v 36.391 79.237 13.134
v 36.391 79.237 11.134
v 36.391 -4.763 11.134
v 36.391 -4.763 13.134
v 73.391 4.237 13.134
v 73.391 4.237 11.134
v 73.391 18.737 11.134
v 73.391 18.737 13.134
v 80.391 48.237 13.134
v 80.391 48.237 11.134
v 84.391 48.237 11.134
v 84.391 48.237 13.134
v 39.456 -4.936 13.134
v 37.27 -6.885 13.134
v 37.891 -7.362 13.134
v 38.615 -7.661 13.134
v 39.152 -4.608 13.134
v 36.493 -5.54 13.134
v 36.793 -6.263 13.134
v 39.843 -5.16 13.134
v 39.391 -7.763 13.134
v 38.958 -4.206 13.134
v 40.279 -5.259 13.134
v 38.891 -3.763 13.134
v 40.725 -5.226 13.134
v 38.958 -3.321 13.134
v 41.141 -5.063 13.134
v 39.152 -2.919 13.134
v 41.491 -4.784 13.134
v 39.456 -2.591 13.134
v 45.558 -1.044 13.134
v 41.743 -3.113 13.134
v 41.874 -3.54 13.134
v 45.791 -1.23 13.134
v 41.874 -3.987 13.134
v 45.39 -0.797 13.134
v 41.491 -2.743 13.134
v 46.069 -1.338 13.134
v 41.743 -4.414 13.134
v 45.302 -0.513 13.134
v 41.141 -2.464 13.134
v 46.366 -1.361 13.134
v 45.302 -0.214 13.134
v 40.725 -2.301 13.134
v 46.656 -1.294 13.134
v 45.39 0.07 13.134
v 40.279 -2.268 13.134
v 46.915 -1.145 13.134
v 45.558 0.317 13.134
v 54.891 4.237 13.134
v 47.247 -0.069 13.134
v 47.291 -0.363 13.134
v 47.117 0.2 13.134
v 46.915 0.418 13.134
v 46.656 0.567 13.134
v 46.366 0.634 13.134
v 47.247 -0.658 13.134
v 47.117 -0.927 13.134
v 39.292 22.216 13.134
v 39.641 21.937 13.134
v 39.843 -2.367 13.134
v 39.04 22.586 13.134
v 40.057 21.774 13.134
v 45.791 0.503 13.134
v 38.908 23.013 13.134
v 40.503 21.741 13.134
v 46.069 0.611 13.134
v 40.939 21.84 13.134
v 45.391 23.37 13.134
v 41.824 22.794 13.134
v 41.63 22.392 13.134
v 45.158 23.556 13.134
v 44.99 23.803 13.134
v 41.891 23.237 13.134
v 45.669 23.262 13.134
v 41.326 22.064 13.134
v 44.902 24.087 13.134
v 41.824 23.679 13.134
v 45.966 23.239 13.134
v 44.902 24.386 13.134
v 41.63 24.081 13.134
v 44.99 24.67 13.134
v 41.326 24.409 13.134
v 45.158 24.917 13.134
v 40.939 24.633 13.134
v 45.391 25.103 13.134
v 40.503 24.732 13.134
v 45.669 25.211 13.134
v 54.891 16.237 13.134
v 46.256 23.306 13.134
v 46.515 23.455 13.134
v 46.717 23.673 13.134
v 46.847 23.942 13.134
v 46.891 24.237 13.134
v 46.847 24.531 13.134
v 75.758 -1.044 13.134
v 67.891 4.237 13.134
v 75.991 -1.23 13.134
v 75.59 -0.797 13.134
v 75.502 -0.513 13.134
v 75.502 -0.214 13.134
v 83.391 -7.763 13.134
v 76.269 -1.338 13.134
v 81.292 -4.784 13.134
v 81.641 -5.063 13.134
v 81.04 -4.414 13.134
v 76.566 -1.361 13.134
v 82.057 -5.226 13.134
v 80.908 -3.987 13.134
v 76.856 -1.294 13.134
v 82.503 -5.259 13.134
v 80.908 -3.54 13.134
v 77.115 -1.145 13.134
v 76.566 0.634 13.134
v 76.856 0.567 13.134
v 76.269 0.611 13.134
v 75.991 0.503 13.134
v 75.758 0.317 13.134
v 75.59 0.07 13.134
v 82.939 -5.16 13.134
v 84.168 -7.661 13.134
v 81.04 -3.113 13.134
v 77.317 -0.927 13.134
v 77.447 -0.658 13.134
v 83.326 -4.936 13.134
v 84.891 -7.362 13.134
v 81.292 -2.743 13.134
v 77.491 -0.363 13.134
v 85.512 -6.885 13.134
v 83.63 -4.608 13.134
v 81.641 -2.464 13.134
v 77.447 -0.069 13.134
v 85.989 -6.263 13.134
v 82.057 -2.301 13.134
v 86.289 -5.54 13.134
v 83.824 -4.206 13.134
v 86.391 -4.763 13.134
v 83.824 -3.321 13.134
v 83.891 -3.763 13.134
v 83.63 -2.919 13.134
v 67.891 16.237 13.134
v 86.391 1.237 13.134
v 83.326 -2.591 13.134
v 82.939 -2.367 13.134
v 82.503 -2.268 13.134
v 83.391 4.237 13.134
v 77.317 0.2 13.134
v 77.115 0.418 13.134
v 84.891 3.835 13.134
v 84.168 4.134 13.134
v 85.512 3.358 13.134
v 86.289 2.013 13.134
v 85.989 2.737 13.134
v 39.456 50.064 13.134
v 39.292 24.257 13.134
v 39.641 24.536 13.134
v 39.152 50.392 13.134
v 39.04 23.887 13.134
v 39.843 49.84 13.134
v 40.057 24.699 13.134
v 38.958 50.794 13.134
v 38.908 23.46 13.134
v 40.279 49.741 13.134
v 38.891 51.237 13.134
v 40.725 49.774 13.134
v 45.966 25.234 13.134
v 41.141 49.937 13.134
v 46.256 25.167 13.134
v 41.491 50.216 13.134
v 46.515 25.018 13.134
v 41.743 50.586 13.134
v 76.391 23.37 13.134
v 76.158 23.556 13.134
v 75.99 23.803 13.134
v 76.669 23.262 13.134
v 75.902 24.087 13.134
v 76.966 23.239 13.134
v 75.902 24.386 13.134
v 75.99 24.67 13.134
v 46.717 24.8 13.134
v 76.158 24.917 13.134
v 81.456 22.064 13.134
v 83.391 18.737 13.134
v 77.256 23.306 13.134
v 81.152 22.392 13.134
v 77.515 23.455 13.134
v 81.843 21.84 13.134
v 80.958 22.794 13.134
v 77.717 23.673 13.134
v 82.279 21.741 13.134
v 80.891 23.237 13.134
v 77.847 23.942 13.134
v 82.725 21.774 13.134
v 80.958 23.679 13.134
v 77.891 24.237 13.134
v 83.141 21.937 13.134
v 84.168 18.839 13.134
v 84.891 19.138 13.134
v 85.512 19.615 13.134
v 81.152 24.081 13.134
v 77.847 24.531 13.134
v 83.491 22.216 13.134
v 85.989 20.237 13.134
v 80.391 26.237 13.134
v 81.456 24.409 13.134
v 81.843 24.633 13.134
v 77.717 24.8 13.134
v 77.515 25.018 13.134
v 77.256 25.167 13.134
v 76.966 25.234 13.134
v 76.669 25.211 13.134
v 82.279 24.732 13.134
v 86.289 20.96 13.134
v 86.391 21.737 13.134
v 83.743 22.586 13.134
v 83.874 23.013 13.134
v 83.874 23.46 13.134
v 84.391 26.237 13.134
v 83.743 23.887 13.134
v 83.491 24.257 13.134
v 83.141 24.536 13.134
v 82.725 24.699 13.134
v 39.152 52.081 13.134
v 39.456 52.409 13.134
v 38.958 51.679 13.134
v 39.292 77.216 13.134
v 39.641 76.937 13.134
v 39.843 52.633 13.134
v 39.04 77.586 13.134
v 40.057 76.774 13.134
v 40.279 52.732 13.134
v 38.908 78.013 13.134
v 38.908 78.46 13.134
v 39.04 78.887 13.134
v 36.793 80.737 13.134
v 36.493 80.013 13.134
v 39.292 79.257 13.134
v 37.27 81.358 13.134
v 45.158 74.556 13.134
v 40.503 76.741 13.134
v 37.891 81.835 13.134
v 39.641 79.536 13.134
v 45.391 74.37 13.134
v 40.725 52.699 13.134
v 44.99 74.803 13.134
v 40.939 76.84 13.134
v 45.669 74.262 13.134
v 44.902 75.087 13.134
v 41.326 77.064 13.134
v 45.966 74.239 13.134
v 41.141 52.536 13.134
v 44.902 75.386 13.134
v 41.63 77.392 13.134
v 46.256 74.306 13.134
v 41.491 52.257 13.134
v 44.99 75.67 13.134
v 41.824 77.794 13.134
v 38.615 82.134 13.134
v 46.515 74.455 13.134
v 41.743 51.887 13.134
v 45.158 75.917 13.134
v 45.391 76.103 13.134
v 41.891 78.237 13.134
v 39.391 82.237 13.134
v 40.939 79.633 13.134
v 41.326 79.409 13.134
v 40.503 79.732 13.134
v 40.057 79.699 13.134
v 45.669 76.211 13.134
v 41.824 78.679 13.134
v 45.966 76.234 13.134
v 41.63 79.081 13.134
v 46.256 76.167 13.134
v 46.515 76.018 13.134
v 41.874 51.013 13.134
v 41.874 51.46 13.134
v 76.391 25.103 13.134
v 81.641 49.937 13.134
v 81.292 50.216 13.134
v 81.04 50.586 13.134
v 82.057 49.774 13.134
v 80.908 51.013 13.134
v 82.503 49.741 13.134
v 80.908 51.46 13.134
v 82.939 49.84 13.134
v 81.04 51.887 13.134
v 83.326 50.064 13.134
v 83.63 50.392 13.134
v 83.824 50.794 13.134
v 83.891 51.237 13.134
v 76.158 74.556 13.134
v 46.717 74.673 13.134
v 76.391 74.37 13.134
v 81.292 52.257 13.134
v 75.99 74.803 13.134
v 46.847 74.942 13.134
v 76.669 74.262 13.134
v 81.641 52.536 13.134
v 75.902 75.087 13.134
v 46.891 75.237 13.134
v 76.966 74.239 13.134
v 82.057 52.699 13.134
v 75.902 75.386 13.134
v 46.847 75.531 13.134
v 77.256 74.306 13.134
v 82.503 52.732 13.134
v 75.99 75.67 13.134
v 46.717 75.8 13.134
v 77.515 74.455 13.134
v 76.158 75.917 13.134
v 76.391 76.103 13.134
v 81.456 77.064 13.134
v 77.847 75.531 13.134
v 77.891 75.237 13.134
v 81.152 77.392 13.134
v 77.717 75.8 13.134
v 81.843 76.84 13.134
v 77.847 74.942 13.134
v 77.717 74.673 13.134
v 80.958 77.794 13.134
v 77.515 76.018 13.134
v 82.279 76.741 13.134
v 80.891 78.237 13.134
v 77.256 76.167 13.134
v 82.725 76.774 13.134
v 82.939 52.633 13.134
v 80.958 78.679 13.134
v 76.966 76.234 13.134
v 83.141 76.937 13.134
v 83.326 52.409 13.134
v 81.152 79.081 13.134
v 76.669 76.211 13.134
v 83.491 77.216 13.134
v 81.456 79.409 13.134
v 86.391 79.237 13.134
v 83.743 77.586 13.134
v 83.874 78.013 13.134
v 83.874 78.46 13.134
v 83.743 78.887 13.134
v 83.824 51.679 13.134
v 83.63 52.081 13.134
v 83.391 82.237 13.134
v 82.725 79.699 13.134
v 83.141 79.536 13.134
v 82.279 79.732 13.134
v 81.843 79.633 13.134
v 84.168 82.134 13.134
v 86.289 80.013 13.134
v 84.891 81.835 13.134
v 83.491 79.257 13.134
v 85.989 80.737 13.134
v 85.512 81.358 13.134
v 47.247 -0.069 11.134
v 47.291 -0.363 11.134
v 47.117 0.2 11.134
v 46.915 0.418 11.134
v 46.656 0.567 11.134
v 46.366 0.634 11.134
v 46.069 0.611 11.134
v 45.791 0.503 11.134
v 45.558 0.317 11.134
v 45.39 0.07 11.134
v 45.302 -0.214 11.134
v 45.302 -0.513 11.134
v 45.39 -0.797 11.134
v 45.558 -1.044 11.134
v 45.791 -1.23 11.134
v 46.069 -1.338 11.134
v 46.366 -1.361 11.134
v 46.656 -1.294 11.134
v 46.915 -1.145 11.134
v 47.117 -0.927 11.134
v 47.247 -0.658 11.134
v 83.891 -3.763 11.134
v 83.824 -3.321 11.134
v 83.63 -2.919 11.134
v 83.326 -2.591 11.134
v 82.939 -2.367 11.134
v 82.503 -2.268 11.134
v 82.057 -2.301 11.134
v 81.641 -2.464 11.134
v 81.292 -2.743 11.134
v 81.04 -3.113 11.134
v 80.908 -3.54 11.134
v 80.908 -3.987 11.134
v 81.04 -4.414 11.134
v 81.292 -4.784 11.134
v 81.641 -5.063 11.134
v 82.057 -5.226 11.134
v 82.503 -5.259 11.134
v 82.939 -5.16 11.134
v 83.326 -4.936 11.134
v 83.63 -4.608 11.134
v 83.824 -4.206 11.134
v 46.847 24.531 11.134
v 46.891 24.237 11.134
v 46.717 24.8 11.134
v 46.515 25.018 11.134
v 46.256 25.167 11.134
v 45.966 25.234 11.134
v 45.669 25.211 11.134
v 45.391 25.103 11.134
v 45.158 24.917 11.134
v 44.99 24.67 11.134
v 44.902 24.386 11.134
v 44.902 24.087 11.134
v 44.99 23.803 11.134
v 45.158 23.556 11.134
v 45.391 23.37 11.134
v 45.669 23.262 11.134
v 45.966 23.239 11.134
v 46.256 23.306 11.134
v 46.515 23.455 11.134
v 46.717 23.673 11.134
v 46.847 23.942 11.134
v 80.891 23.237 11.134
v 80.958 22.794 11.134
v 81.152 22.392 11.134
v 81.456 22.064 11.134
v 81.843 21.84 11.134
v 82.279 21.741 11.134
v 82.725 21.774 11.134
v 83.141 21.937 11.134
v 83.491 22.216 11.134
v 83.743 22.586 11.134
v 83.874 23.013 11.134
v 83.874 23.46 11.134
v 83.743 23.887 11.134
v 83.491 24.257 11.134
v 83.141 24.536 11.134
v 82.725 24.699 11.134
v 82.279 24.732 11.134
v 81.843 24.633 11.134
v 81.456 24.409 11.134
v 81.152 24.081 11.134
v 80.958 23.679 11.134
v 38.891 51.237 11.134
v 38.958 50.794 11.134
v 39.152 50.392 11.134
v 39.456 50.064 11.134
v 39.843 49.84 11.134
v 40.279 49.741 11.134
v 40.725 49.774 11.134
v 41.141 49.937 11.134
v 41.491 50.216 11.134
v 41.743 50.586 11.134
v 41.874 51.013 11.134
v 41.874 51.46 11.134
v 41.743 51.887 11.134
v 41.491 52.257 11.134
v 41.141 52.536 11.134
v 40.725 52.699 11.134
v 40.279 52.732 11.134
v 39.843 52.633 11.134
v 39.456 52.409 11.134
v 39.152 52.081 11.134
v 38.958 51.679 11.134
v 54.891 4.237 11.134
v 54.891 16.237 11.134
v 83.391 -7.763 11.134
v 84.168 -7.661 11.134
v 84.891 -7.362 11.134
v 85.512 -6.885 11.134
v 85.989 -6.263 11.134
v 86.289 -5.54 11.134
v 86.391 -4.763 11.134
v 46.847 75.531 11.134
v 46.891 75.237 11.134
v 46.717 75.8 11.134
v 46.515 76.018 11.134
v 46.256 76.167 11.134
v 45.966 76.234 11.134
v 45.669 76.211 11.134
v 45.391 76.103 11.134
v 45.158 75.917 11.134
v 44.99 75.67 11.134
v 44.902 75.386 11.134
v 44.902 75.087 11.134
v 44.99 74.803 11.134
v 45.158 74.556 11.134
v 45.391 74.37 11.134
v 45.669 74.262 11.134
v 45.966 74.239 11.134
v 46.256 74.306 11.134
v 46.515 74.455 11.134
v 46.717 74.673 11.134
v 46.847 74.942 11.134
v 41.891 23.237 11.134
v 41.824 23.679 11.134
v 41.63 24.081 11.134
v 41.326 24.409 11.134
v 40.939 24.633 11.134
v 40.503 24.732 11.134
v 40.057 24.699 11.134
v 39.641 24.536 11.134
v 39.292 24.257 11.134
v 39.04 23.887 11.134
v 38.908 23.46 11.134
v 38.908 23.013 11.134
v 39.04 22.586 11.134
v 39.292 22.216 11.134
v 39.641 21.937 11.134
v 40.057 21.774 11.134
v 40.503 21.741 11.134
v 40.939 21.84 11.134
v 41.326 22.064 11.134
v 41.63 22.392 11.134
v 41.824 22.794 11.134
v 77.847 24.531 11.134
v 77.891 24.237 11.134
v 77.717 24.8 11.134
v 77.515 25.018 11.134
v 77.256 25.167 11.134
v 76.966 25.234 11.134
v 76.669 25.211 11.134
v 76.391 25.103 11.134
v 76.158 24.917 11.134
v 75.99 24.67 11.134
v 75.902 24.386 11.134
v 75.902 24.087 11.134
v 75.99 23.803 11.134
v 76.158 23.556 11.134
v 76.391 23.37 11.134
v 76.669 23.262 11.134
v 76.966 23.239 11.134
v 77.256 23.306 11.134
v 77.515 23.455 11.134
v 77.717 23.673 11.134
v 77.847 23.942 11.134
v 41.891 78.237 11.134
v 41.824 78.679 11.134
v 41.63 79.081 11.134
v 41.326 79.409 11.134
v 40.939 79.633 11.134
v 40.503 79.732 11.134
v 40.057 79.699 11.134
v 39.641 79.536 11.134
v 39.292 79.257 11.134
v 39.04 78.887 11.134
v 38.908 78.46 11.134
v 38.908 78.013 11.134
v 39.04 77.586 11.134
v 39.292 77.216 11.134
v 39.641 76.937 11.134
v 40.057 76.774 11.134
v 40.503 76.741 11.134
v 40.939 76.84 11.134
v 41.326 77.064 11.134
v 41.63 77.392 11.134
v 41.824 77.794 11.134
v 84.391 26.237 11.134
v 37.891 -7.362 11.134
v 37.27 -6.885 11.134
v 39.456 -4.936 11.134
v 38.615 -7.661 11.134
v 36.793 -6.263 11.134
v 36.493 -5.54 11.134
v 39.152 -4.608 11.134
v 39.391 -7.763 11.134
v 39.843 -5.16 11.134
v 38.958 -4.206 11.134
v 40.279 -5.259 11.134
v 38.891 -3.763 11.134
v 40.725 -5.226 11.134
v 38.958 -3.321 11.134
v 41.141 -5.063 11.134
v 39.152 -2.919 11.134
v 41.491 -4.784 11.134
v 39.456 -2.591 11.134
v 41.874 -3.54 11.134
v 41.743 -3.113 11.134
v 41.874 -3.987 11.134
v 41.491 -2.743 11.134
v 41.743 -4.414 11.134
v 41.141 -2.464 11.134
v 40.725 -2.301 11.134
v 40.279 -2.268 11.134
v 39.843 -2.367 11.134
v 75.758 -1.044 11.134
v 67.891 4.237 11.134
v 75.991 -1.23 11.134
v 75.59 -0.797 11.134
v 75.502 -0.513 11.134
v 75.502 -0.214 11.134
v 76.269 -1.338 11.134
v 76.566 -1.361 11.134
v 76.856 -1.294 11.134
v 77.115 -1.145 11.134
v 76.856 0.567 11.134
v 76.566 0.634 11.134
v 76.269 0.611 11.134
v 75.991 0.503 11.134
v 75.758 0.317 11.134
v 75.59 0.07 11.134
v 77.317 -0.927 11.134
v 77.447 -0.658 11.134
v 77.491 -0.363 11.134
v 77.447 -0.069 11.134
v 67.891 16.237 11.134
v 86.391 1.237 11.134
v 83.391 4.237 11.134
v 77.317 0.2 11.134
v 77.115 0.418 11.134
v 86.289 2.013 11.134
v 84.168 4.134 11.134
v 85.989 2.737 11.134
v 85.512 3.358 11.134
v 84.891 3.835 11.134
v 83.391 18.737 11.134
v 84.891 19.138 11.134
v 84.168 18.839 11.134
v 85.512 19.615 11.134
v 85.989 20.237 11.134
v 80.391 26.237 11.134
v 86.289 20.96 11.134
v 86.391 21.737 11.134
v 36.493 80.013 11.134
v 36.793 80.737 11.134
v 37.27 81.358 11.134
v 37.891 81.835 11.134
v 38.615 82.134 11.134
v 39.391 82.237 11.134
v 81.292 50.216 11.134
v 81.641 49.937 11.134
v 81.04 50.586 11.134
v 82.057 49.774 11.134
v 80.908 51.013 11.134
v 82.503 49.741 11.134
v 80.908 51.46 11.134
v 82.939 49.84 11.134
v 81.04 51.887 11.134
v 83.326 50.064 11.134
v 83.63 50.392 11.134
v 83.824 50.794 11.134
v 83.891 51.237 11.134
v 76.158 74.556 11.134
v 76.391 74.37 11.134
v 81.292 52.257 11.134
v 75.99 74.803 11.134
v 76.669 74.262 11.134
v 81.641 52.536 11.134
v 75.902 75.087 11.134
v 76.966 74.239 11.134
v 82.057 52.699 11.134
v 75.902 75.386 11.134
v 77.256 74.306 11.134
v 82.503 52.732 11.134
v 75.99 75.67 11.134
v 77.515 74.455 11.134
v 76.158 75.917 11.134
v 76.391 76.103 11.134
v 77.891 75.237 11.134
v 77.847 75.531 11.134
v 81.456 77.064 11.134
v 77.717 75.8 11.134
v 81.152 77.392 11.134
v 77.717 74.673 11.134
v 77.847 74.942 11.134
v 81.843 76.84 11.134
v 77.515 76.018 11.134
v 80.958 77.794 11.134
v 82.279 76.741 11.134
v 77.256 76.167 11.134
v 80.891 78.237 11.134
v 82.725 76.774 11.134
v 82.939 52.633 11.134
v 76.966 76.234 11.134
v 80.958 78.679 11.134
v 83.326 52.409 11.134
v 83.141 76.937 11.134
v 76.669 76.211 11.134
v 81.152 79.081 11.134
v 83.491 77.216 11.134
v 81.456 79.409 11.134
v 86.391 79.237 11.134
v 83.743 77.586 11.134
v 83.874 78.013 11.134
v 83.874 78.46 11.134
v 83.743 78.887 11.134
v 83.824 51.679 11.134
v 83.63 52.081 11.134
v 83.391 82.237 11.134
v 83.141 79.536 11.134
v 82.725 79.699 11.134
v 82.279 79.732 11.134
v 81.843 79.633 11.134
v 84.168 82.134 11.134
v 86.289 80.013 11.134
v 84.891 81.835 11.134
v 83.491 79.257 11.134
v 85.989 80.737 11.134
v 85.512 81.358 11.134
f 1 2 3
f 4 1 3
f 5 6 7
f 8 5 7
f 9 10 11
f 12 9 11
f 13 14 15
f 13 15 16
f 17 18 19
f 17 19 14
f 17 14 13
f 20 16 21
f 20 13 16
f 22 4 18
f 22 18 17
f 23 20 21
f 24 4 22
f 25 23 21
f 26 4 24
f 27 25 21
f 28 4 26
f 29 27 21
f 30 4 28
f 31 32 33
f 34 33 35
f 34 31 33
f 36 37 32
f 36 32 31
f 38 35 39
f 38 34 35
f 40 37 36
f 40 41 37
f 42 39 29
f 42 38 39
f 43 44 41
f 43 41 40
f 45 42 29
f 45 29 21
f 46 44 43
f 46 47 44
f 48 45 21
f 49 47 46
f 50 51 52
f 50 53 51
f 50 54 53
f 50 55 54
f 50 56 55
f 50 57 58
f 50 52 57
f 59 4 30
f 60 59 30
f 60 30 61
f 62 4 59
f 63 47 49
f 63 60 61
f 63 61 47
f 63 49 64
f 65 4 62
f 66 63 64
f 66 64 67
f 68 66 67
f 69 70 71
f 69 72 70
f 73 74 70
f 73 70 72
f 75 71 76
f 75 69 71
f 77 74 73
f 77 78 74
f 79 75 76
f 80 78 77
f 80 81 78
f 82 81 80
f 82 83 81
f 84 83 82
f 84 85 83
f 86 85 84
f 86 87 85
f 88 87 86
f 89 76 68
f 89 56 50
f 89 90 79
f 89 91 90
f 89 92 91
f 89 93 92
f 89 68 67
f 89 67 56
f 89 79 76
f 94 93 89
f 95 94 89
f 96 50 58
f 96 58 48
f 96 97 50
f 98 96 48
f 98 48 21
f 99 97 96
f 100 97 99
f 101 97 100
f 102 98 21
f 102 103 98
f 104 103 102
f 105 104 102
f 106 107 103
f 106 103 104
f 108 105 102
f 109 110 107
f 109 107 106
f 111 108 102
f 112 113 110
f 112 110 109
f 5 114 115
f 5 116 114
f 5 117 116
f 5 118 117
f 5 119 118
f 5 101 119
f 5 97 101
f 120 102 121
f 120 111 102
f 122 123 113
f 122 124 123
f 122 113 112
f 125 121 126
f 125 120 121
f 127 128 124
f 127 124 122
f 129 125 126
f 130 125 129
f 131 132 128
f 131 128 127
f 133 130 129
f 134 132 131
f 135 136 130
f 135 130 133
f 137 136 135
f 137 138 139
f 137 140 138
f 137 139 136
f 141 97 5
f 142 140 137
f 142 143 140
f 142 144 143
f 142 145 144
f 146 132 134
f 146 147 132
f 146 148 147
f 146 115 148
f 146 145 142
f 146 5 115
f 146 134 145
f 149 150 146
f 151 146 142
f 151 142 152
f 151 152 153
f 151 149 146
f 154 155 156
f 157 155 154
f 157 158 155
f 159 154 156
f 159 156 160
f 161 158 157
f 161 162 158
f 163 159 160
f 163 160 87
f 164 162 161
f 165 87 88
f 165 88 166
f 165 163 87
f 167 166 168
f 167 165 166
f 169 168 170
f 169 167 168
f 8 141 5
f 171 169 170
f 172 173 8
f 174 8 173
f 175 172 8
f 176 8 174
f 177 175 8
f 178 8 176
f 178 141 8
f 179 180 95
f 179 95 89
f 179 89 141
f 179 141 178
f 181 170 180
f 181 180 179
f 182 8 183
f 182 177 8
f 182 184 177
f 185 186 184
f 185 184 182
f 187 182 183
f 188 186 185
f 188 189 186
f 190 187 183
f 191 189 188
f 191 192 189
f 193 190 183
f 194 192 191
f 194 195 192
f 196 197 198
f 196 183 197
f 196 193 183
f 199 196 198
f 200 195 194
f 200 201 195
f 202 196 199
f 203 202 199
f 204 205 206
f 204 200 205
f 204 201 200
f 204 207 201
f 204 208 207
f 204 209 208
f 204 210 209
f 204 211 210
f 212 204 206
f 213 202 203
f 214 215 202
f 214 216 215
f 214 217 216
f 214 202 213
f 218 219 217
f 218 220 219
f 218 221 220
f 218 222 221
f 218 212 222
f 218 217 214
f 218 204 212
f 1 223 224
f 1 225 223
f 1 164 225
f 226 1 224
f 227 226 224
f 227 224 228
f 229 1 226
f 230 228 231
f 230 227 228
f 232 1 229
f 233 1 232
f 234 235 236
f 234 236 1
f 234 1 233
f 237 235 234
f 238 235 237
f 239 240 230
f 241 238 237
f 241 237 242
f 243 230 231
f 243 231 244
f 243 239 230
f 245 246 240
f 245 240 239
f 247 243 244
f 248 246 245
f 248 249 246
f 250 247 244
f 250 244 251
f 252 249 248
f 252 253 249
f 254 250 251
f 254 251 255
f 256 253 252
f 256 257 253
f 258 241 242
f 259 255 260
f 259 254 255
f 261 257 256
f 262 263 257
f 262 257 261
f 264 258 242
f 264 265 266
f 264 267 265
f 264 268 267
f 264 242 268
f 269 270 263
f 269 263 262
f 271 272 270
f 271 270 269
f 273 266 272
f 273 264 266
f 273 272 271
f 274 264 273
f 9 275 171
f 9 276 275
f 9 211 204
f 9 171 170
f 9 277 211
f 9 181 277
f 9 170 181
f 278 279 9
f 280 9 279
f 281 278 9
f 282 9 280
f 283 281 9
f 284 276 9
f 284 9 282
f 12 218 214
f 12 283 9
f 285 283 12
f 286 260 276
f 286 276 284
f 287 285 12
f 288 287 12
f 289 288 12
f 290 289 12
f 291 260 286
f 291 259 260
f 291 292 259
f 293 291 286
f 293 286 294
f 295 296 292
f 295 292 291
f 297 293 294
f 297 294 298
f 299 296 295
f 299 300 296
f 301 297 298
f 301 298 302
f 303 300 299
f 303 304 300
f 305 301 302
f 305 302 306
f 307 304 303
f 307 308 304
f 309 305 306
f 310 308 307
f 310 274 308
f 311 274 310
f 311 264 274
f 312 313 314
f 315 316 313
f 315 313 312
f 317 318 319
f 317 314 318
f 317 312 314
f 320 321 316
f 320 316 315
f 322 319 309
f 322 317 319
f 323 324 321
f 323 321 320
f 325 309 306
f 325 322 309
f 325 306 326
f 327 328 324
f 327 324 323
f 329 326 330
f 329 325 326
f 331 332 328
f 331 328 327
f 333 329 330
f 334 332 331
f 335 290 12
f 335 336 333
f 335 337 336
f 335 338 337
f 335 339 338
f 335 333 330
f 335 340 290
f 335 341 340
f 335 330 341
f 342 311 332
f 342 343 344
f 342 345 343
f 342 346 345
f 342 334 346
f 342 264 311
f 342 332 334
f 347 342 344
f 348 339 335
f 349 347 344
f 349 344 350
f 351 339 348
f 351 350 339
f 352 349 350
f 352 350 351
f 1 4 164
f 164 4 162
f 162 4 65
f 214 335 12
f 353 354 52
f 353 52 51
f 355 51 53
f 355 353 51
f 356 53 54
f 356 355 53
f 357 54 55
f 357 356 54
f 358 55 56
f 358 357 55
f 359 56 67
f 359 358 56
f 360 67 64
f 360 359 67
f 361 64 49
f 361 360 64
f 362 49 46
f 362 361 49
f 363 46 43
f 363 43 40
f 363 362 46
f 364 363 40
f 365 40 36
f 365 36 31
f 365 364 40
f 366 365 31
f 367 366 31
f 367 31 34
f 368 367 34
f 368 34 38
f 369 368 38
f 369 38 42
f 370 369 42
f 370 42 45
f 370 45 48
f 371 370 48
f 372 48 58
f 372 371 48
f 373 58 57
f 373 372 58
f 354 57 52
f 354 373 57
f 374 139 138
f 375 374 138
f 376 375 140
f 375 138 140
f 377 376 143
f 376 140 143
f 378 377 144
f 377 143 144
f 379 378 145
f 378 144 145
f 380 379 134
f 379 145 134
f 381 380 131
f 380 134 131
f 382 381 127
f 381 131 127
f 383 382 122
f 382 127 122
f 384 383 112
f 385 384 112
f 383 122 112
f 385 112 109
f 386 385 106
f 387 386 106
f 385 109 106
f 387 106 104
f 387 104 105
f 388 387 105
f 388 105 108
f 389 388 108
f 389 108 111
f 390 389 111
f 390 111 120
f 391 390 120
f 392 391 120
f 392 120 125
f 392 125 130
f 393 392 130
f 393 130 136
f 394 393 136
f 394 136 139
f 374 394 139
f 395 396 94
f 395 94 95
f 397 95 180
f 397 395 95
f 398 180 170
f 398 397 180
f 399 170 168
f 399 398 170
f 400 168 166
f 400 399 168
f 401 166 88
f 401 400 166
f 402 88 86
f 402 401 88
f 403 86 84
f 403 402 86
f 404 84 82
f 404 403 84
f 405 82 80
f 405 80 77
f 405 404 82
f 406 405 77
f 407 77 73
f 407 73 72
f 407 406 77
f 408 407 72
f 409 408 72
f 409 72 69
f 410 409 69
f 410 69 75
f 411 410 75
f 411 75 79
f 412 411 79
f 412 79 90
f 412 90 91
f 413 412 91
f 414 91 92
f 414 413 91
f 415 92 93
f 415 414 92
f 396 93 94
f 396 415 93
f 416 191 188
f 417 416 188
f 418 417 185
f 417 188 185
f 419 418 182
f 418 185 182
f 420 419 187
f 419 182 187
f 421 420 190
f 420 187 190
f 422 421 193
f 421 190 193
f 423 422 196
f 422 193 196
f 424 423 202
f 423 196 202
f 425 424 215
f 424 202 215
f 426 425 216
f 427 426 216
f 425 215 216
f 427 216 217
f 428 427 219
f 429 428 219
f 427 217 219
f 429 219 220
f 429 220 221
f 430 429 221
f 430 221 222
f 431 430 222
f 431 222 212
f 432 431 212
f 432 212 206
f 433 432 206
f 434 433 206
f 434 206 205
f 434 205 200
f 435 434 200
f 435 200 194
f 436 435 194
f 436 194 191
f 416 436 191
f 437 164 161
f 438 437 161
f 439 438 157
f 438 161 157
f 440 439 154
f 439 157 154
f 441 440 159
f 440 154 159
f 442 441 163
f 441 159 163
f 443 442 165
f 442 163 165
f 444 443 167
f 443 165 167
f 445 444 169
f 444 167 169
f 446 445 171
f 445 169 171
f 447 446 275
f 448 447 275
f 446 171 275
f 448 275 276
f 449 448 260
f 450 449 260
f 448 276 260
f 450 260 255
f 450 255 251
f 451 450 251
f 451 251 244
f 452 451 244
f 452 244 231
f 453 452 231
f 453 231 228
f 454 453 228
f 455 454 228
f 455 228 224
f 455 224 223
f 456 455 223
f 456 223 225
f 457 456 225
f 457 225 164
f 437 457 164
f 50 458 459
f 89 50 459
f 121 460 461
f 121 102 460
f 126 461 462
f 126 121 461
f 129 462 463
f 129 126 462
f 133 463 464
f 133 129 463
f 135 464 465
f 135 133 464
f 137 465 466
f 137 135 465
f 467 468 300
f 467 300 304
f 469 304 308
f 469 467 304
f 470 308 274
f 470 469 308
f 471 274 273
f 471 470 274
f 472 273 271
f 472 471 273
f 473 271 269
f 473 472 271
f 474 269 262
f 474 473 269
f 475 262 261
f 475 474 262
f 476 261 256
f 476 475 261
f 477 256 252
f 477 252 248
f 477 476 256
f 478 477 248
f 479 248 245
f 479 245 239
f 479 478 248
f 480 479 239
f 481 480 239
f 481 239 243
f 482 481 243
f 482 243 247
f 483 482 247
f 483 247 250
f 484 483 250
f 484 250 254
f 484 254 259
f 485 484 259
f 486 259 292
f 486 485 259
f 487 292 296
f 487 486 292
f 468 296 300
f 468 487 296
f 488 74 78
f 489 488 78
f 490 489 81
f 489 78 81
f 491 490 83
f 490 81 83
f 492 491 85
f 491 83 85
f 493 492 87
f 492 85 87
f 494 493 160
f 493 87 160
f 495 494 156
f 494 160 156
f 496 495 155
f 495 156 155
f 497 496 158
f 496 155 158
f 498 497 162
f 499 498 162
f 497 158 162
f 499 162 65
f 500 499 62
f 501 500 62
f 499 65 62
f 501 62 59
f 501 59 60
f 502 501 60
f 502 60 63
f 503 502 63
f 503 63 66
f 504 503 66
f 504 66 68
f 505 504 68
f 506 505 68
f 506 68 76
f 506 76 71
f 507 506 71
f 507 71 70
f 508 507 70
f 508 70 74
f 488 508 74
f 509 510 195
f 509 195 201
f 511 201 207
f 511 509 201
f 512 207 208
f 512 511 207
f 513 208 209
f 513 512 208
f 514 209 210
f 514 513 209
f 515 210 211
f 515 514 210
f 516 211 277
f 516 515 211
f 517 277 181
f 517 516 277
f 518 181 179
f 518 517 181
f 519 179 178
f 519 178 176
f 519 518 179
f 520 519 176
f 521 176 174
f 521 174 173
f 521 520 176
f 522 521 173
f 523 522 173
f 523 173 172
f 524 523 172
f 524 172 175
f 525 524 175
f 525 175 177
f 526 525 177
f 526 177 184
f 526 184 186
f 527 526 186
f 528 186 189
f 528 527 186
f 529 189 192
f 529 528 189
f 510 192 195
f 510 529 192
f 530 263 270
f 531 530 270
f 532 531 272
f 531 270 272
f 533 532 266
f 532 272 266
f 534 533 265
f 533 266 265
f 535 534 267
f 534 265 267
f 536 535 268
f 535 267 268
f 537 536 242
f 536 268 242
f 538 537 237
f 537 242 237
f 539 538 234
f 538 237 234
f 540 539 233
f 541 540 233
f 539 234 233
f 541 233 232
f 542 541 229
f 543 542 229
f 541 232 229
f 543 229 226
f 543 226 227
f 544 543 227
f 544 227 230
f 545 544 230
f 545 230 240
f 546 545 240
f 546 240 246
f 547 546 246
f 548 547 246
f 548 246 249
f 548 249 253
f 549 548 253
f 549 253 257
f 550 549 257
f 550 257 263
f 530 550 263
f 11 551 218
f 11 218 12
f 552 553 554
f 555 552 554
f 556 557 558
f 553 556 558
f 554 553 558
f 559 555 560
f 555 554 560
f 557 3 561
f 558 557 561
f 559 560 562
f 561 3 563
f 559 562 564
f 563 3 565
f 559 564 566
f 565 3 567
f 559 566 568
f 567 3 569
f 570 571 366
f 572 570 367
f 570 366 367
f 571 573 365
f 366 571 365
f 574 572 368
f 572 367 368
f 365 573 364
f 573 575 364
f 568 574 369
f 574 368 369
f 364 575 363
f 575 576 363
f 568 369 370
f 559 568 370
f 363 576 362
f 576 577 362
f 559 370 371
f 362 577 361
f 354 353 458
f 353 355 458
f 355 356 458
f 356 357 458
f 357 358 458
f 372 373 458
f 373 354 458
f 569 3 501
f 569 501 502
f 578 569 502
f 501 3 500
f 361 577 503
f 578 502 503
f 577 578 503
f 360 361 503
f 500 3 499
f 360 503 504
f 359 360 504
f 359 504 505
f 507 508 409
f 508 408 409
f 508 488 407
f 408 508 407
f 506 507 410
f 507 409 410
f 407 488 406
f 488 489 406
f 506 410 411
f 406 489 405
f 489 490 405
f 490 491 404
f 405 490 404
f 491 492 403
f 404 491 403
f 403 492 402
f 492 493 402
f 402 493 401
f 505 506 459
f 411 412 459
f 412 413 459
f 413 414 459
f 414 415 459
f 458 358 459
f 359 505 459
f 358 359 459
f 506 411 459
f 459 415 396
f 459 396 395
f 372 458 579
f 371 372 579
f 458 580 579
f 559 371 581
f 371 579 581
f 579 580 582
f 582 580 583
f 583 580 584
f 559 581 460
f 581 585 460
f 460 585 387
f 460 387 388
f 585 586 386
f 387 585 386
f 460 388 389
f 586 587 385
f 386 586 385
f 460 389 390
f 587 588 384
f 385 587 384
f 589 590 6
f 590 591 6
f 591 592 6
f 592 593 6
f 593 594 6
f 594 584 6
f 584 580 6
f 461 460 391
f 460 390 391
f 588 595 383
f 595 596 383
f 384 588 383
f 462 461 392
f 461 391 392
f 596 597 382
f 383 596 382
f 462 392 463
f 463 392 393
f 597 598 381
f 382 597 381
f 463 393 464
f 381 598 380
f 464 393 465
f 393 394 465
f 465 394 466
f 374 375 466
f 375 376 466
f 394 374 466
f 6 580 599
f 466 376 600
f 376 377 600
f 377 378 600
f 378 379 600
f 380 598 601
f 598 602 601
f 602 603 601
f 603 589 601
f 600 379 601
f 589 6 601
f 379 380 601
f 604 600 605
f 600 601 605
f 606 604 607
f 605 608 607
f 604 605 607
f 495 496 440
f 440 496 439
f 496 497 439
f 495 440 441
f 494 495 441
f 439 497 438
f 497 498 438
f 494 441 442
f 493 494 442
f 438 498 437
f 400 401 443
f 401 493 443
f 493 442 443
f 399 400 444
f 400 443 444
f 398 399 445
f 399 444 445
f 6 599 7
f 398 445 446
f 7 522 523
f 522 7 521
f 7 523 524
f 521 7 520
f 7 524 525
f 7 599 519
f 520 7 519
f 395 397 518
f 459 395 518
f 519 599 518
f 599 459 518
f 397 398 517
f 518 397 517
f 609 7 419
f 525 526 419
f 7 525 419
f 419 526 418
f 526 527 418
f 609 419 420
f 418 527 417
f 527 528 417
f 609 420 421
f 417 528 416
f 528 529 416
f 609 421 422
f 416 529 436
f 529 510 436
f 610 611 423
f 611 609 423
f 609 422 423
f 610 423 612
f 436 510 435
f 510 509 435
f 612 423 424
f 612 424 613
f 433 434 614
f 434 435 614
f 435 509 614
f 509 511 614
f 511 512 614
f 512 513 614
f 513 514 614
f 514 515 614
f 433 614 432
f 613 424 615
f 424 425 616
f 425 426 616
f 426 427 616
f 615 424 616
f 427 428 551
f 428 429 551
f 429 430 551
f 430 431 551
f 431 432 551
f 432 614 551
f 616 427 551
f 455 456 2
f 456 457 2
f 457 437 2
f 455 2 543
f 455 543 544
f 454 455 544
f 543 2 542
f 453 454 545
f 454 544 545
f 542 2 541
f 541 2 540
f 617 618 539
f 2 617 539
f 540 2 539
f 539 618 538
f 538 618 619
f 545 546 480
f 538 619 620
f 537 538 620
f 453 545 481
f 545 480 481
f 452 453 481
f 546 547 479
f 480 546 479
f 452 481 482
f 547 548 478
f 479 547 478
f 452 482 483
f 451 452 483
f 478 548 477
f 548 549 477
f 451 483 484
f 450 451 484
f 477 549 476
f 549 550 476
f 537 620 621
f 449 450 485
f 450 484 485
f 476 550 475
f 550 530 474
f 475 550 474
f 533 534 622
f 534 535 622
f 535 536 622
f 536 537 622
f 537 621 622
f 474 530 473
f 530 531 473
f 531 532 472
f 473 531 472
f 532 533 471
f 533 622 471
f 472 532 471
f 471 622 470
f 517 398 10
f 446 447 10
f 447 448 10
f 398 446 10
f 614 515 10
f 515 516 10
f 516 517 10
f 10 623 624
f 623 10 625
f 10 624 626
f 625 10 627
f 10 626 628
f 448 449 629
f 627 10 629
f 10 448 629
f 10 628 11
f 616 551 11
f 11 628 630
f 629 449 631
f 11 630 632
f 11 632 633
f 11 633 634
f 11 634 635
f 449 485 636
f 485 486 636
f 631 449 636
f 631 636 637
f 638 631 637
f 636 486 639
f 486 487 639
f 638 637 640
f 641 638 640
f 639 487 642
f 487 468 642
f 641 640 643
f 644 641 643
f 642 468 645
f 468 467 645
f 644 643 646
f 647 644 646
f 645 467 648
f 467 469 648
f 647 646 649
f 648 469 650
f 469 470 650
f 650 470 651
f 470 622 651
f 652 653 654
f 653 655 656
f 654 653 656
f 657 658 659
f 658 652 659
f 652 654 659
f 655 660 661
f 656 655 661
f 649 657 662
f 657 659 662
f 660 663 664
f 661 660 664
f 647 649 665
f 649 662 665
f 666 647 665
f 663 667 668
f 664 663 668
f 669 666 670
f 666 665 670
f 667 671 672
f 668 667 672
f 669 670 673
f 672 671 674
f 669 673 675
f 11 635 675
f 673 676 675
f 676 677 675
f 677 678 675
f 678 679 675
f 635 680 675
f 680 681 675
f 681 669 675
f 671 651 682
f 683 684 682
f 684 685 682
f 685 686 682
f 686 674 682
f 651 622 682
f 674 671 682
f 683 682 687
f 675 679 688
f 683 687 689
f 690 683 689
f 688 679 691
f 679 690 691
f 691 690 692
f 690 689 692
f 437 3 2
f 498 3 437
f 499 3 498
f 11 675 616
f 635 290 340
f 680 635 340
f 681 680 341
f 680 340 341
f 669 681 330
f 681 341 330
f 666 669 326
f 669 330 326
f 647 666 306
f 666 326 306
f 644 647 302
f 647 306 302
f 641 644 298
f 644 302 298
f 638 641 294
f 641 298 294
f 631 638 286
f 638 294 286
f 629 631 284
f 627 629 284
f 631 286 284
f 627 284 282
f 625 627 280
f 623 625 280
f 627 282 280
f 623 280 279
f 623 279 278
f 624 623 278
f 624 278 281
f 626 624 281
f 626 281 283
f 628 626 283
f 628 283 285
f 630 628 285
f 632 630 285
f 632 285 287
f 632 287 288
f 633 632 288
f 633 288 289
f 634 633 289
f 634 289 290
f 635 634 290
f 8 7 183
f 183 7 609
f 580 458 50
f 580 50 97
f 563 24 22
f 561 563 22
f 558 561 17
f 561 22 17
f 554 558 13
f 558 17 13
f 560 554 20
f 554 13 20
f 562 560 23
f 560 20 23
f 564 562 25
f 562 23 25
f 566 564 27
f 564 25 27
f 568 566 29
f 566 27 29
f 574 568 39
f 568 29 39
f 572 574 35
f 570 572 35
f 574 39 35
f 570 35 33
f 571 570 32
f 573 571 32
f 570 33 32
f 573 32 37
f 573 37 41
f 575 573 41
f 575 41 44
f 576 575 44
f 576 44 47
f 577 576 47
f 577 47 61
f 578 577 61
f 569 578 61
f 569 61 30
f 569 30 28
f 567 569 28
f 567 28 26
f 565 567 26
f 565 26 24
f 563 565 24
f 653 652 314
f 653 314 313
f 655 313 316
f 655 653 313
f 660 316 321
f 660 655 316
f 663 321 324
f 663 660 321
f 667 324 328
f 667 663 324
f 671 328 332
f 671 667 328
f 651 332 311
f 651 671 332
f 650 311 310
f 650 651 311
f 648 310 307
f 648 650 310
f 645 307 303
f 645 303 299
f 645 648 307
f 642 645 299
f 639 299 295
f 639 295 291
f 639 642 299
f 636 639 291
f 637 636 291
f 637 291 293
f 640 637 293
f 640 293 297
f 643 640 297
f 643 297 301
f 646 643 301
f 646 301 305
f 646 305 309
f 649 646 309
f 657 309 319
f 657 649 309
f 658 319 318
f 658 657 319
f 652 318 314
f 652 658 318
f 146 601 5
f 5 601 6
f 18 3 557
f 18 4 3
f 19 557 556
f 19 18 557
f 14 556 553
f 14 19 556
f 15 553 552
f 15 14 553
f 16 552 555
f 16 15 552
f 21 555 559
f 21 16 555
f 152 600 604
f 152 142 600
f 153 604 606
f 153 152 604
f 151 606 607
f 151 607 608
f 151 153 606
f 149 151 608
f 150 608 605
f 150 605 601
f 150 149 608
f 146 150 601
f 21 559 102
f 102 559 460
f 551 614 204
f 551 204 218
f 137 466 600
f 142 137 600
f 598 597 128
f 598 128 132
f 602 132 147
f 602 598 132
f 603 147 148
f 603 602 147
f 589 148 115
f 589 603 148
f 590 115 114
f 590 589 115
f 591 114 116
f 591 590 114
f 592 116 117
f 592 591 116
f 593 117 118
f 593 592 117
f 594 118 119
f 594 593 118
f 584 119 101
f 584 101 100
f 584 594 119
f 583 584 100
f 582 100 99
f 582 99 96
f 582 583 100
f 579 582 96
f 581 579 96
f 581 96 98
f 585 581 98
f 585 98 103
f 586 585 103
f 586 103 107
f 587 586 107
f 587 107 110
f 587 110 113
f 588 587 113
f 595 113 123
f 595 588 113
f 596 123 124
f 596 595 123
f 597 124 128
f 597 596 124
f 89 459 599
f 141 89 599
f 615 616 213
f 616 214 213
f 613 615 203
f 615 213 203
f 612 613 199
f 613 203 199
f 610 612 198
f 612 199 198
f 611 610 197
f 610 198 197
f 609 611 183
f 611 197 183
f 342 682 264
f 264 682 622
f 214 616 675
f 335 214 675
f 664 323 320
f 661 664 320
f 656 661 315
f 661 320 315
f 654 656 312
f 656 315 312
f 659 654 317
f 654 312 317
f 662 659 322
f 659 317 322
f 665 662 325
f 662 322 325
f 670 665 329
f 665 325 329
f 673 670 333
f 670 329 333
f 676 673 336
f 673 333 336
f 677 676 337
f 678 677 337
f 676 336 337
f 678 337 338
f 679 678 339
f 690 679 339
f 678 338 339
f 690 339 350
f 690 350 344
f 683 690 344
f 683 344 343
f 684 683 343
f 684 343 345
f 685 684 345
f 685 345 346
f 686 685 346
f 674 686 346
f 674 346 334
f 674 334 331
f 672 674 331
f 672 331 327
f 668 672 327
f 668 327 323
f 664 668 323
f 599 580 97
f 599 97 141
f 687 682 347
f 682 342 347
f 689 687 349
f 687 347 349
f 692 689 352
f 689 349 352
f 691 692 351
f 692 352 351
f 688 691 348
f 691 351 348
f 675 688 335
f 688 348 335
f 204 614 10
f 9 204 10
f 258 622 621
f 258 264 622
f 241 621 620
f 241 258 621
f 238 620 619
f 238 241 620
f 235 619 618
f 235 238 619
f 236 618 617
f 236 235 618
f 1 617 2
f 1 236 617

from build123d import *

# Parameters (mm, degrees)
SKETCH_1_R          = 1.00000054
SKETCH_1_W          = 13
SKETCH_1_H          = 12
SKETCH_1_W_2        = 35.054000855
SKETCH_1_H_2        = 47
SKETCH_1_W_3        = 4
SKETCH_1_H_3        = 22
EXTRUDE_1_DEPTH     = 2
FILLET_2_R          = 3
SKETCH_2_R          = 1.5
CUT_EXTRUDE_1_DEPTH = 120.290710997


with BuildPart() as part:
    # 草图1 → 凸台-拉伸1 (new body)
    # profile 1 of 2: a face of its own
    with BuildSketch(Plane.XY.offset(11.133645354)):
        Polygon((86.391138075, 82.236518604), (36.391138075, 82.236518604), (36.391138075, -7.763481396), (86.391138075, -7.763481396), (86.391138075, 4.236518604), (73.391138075, 4.236518604), (73.391138075, 18.736518604), (86.391138075, 18.736518604), align=None)
        with Locations((46.291138075, -0.363481396)):
            Circle(SKETCH_1_R, mode=Mode.SUBTRACT)
        with Locations((45.891138075, 24.236518604)):
            Circle(SKETCH_1_R, mode=Mode.SUBTRACT)
        with Locations((61.391138075, 10.236518604)):
            Rectangle(SKETCH_1_W, SKETCH_1_H, mode=Mode.SUBTRACT)
        with Locations((76.491138075, -0.363481396)):
            Circle(SKETCH_1_R, mode=Mode.SUBTRACT)
        with Locations((76.891138075, 24.236518604)):
            Circle(SKETCH_1_R, mode=Mode.SUBTRACT)
        with Locations((61.385138076, 49.650651887)):
            Rectangle(SKETCH_1_W_2, SKETCH_1_H_2, mode=Mode.SUBTRACT)
        with Locations((45.891138075, 75.236518604)):
            Circle(SKETCH_1_R, mode=Mode.SUBTRACT)
        with Locations((82.391138075, 37.236518604)):
            Rectangle(SKETCH_1_W_3, SKETCH_1_H_3, mode=Mode.SUBTRACT)
        with Locations((76.891138075, 75.236518604)):
            Circle(SKETCH_1_R, mode=Mode.SUBTRACT)
    # profile 2 of 2: a face of its own
    with BuildSketch(Plane.XY.offset(11.133645354)):
        with Locations((61.385138076, 49.650651887)):
            Rectangle(SKETCH_1_W_2, SKETCH_1_H_2)
    extrude(amount=EXTRUDE_1_DEPTH)

    # 圆角2
    fillet_2_edges = [part.edges().sort_by_distance(p)[0] for p in [
        (86.391138075, 4.236518604, 12.133645354),
        (86.391138075, -7.763481396, 12.133645354),
        (36.391138075, -7.763481396, 12.133645354),
        (36.391138075, 82.236518604, 12.133645354),
        (86.391138075, 82.236518604, 12.133645354),
        (86.391138075, 18.736518604, 12.133645354),
    ]]
    fillet(fillet_2_edges, radius=FILLET_2_R)

    # 草图2 → 切除-拉伸1 (cut, through all)
    with BuildSketch(Plane.XY.offset(13.133645354)):
        with Locations((40.391138075, 78.236518604)):
            Circle(SKETCH_2_R)
        with Locations(Location((82.391138075, 78.236518604, 0), (0, 0, 180))):
            Circle(SKETCH_2_R)
        with Locations((40.391138075, 23.236518604)):
            Circle(SKETCH_2_R)
        with Locations(Location((82.391138075, 23.236518604, 0), (0, 0, 180))):
            Circle(SKETCH_2_R)
        with Locations(Location((40.391138075, 51.236518604, 0), (0, 0, 180))):
            Circle(SKETCH_2_R)
        with Locations((82.391138075, 51.236518604)):
            Circle(SKETCH_2_R)
        with Locations((82.391138075, -3.763481396)):
            Circle(SKETCH_2_R)
        with Locations(Location((40.391138075, -3.763481396, 0), (0, 0, 180))):
            Circle(SKETCH_2_R)
    extrude(amount=-CUT_EXTRUDE_1_DEPTH, mode=Mode.SUBTRACT)


solid = part.part
